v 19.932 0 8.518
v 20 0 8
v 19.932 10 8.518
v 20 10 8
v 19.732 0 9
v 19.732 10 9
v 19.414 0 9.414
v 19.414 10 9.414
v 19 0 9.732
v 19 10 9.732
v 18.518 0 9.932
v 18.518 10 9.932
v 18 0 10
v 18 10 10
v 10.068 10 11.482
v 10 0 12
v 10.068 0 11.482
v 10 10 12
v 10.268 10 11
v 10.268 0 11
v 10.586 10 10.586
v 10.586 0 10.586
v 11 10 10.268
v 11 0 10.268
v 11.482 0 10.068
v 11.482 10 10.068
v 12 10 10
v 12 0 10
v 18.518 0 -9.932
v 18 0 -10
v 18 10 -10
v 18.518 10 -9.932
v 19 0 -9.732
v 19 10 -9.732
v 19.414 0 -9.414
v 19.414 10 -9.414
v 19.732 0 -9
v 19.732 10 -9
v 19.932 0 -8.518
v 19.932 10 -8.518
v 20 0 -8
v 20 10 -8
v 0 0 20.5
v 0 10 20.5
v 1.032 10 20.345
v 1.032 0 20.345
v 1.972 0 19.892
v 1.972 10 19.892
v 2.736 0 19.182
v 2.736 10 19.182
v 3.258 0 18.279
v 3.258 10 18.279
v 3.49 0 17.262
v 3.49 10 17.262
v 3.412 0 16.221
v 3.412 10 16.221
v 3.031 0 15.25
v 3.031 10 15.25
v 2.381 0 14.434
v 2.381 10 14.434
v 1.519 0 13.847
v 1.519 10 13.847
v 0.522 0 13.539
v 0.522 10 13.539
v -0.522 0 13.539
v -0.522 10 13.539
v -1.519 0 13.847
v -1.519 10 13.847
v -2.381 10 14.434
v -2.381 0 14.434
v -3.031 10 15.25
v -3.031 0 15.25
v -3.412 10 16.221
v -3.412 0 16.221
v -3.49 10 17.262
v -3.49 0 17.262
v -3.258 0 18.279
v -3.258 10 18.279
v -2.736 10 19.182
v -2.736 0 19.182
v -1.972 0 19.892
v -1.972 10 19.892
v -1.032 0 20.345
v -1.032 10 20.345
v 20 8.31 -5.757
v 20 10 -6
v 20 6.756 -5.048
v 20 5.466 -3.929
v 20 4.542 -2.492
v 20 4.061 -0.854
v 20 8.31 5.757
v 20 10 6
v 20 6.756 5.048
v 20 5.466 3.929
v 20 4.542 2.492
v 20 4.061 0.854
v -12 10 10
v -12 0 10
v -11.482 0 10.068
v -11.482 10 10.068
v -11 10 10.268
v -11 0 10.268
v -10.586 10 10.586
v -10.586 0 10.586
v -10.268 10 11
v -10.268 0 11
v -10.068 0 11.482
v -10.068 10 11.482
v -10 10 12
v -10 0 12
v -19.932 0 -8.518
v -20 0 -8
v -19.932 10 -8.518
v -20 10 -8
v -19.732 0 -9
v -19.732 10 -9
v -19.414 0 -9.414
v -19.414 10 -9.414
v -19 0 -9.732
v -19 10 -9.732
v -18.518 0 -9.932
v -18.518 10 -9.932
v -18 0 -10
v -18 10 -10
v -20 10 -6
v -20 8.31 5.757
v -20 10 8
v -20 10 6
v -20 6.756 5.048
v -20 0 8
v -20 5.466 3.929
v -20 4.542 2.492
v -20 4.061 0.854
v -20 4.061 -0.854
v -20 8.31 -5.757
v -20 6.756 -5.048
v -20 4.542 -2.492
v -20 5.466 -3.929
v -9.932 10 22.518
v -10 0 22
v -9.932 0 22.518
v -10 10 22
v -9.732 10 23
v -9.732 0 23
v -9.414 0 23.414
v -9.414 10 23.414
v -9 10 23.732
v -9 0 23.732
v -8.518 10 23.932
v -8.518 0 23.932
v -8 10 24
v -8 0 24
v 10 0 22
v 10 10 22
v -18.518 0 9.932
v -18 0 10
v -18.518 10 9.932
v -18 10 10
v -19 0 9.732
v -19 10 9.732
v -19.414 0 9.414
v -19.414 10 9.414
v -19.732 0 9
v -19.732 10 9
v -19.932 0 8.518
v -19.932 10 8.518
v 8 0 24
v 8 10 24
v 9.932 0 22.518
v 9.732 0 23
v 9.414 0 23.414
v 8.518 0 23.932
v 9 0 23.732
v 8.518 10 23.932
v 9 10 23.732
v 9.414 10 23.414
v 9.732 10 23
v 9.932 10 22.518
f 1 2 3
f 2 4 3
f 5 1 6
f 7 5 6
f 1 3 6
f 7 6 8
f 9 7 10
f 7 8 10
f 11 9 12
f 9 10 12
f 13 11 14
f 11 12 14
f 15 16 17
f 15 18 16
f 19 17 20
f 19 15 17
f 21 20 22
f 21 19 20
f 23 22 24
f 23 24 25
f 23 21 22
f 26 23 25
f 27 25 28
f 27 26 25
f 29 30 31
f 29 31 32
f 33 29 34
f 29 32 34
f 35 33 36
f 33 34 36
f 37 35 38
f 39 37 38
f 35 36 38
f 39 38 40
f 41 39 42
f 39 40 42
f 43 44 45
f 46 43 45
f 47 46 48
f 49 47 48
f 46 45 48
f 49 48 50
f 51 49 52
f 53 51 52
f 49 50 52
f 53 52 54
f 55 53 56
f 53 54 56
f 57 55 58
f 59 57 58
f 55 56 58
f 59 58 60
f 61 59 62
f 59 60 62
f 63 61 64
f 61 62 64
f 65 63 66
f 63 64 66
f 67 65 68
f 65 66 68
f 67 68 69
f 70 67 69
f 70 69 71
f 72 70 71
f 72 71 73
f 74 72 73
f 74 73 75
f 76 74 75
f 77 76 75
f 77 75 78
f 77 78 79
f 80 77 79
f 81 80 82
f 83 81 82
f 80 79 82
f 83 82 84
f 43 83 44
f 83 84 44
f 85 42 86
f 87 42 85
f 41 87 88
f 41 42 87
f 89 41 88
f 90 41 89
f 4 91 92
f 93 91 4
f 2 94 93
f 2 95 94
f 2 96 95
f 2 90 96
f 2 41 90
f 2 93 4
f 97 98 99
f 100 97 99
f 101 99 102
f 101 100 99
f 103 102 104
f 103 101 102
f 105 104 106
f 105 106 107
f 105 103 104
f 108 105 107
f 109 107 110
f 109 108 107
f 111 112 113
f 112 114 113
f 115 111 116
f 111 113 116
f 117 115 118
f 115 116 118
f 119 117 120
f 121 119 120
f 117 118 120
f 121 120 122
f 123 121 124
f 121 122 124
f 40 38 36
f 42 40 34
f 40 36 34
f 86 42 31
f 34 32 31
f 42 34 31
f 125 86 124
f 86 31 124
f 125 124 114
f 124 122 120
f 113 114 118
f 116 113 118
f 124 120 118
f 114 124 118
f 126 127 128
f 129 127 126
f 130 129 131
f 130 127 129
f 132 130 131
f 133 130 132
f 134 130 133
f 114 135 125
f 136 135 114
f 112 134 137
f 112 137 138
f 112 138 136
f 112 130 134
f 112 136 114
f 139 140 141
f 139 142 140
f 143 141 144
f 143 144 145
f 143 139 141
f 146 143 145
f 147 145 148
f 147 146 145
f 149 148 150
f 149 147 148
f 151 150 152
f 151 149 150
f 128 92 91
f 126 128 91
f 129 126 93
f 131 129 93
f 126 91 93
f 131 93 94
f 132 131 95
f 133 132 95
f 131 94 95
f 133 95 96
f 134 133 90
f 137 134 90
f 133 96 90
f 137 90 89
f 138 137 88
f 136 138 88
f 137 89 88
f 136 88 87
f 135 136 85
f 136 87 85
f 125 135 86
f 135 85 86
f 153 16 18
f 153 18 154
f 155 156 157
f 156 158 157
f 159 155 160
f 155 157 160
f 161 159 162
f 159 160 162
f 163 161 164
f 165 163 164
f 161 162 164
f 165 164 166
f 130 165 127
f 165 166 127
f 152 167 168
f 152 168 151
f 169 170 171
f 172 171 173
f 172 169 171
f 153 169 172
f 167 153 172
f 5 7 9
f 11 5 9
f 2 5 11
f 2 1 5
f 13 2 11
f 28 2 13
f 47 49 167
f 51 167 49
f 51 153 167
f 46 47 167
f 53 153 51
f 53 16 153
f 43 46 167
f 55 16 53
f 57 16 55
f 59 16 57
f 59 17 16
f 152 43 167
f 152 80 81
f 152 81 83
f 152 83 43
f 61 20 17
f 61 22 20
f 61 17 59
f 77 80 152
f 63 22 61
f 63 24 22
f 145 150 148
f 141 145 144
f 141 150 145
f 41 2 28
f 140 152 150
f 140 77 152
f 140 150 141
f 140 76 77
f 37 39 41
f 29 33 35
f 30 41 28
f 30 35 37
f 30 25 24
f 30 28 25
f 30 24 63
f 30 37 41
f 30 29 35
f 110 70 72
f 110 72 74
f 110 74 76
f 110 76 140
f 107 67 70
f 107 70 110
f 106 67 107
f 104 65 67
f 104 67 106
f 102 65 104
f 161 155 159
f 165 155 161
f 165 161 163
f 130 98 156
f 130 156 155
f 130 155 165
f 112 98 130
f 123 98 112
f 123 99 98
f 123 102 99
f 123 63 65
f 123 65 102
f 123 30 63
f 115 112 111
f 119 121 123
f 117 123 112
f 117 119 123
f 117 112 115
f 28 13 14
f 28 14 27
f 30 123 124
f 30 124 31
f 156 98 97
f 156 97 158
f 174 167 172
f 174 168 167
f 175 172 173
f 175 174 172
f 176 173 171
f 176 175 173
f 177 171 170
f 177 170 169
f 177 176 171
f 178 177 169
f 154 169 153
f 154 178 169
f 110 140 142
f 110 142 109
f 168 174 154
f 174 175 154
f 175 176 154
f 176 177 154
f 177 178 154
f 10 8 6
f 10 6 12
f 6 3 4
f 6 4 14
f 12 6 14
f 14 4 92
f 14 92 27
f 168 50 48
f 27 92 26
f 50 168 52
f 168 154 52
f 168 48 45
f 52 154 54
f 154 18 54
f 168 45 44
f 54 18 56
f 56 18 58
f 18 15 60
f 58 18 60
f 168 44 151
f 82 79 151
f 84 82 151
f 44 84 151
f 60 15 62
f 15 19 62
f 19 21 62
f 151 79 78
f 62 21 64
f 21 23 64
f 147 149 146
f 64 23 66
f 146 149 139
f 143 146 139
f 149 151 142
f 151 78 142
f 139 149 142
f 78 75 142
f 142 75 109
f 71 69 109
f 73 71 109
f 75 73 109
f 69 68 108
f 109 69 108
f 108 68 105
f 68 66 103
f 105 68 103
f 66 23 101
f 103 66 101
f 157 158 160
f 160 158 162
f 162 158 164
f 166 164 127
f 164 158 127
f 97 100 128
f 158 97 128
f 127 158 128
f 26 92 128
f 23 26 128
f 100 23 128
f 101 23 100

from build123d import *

# Parameters (mm, degrees)
BOSS_EXTRUDE1_DEPTH = 10
SKETCH2_R           = 3.5
CUT_EXTRUDE1_DEPTH  = 10
SKETCH3_R           = 6
CUT_EXTRUDE2_DEPTH  = 48.707441768
FILLET1_R           = 2


with BuildPart() as part:
    # Sketch1 → Boss-Extrude1 (new body)
    with BuildSketch(Plane(origin=(0, 0, 0), x_dir=(1, 0, 0), z_dir=(0, 1, 0))):
        Polygon((-10, -10), (-20, -10), (-20, 10), (20, 10), (20, -10), (10, -10), (10, -24), (-10, -24), align=None)
    extrude(amount=BOSS_EXTRUDE1_DEPTH)

    # Sketch2 → Cut-Extrude1 (cut)
    with BuildSketch(Plane(origin=(0, 10, 0), x_dir=(1, 0, 0), z_dir=(0, 1, 0))):
        with Locations(Location((0, -17, 0), (0, 0, 270))):
            Circle(SKETCH2_R)
    extrude(amount=-CUT_EXTRUDE1_DEPTH, mode=Mode.SUBTRACT)

    # Sketch3 → Cut-Extrude2 (cut, through all)
    with BuildSketch(Plane(origin=(20, 0, 0), x_dir=(0, 0, -1), z_dir=(1, 0, 0))):
        with Locations((0, 10)):
            Circle(SKETCH3_R)
    extrude(amount=-CUT_EXTRUDE2_DEPTH, mode=Mode.SUBTRACT)

    # Fillet1
    fillet1_edges = [part.edges().sort_by_distance(p)[0] for p in [
        (-20, 5, -10),
        (20, 5, -10),
        (20, 5, 10),
        (10, 5, 10),
        (10, 5, 24),
        (-10, 5, 24),
        (-10, 5, 10),
        (-20, 5, 10),
    ]]
    fillet(fillet1_edges, radius=FILLET1_R)


solid = part.part
